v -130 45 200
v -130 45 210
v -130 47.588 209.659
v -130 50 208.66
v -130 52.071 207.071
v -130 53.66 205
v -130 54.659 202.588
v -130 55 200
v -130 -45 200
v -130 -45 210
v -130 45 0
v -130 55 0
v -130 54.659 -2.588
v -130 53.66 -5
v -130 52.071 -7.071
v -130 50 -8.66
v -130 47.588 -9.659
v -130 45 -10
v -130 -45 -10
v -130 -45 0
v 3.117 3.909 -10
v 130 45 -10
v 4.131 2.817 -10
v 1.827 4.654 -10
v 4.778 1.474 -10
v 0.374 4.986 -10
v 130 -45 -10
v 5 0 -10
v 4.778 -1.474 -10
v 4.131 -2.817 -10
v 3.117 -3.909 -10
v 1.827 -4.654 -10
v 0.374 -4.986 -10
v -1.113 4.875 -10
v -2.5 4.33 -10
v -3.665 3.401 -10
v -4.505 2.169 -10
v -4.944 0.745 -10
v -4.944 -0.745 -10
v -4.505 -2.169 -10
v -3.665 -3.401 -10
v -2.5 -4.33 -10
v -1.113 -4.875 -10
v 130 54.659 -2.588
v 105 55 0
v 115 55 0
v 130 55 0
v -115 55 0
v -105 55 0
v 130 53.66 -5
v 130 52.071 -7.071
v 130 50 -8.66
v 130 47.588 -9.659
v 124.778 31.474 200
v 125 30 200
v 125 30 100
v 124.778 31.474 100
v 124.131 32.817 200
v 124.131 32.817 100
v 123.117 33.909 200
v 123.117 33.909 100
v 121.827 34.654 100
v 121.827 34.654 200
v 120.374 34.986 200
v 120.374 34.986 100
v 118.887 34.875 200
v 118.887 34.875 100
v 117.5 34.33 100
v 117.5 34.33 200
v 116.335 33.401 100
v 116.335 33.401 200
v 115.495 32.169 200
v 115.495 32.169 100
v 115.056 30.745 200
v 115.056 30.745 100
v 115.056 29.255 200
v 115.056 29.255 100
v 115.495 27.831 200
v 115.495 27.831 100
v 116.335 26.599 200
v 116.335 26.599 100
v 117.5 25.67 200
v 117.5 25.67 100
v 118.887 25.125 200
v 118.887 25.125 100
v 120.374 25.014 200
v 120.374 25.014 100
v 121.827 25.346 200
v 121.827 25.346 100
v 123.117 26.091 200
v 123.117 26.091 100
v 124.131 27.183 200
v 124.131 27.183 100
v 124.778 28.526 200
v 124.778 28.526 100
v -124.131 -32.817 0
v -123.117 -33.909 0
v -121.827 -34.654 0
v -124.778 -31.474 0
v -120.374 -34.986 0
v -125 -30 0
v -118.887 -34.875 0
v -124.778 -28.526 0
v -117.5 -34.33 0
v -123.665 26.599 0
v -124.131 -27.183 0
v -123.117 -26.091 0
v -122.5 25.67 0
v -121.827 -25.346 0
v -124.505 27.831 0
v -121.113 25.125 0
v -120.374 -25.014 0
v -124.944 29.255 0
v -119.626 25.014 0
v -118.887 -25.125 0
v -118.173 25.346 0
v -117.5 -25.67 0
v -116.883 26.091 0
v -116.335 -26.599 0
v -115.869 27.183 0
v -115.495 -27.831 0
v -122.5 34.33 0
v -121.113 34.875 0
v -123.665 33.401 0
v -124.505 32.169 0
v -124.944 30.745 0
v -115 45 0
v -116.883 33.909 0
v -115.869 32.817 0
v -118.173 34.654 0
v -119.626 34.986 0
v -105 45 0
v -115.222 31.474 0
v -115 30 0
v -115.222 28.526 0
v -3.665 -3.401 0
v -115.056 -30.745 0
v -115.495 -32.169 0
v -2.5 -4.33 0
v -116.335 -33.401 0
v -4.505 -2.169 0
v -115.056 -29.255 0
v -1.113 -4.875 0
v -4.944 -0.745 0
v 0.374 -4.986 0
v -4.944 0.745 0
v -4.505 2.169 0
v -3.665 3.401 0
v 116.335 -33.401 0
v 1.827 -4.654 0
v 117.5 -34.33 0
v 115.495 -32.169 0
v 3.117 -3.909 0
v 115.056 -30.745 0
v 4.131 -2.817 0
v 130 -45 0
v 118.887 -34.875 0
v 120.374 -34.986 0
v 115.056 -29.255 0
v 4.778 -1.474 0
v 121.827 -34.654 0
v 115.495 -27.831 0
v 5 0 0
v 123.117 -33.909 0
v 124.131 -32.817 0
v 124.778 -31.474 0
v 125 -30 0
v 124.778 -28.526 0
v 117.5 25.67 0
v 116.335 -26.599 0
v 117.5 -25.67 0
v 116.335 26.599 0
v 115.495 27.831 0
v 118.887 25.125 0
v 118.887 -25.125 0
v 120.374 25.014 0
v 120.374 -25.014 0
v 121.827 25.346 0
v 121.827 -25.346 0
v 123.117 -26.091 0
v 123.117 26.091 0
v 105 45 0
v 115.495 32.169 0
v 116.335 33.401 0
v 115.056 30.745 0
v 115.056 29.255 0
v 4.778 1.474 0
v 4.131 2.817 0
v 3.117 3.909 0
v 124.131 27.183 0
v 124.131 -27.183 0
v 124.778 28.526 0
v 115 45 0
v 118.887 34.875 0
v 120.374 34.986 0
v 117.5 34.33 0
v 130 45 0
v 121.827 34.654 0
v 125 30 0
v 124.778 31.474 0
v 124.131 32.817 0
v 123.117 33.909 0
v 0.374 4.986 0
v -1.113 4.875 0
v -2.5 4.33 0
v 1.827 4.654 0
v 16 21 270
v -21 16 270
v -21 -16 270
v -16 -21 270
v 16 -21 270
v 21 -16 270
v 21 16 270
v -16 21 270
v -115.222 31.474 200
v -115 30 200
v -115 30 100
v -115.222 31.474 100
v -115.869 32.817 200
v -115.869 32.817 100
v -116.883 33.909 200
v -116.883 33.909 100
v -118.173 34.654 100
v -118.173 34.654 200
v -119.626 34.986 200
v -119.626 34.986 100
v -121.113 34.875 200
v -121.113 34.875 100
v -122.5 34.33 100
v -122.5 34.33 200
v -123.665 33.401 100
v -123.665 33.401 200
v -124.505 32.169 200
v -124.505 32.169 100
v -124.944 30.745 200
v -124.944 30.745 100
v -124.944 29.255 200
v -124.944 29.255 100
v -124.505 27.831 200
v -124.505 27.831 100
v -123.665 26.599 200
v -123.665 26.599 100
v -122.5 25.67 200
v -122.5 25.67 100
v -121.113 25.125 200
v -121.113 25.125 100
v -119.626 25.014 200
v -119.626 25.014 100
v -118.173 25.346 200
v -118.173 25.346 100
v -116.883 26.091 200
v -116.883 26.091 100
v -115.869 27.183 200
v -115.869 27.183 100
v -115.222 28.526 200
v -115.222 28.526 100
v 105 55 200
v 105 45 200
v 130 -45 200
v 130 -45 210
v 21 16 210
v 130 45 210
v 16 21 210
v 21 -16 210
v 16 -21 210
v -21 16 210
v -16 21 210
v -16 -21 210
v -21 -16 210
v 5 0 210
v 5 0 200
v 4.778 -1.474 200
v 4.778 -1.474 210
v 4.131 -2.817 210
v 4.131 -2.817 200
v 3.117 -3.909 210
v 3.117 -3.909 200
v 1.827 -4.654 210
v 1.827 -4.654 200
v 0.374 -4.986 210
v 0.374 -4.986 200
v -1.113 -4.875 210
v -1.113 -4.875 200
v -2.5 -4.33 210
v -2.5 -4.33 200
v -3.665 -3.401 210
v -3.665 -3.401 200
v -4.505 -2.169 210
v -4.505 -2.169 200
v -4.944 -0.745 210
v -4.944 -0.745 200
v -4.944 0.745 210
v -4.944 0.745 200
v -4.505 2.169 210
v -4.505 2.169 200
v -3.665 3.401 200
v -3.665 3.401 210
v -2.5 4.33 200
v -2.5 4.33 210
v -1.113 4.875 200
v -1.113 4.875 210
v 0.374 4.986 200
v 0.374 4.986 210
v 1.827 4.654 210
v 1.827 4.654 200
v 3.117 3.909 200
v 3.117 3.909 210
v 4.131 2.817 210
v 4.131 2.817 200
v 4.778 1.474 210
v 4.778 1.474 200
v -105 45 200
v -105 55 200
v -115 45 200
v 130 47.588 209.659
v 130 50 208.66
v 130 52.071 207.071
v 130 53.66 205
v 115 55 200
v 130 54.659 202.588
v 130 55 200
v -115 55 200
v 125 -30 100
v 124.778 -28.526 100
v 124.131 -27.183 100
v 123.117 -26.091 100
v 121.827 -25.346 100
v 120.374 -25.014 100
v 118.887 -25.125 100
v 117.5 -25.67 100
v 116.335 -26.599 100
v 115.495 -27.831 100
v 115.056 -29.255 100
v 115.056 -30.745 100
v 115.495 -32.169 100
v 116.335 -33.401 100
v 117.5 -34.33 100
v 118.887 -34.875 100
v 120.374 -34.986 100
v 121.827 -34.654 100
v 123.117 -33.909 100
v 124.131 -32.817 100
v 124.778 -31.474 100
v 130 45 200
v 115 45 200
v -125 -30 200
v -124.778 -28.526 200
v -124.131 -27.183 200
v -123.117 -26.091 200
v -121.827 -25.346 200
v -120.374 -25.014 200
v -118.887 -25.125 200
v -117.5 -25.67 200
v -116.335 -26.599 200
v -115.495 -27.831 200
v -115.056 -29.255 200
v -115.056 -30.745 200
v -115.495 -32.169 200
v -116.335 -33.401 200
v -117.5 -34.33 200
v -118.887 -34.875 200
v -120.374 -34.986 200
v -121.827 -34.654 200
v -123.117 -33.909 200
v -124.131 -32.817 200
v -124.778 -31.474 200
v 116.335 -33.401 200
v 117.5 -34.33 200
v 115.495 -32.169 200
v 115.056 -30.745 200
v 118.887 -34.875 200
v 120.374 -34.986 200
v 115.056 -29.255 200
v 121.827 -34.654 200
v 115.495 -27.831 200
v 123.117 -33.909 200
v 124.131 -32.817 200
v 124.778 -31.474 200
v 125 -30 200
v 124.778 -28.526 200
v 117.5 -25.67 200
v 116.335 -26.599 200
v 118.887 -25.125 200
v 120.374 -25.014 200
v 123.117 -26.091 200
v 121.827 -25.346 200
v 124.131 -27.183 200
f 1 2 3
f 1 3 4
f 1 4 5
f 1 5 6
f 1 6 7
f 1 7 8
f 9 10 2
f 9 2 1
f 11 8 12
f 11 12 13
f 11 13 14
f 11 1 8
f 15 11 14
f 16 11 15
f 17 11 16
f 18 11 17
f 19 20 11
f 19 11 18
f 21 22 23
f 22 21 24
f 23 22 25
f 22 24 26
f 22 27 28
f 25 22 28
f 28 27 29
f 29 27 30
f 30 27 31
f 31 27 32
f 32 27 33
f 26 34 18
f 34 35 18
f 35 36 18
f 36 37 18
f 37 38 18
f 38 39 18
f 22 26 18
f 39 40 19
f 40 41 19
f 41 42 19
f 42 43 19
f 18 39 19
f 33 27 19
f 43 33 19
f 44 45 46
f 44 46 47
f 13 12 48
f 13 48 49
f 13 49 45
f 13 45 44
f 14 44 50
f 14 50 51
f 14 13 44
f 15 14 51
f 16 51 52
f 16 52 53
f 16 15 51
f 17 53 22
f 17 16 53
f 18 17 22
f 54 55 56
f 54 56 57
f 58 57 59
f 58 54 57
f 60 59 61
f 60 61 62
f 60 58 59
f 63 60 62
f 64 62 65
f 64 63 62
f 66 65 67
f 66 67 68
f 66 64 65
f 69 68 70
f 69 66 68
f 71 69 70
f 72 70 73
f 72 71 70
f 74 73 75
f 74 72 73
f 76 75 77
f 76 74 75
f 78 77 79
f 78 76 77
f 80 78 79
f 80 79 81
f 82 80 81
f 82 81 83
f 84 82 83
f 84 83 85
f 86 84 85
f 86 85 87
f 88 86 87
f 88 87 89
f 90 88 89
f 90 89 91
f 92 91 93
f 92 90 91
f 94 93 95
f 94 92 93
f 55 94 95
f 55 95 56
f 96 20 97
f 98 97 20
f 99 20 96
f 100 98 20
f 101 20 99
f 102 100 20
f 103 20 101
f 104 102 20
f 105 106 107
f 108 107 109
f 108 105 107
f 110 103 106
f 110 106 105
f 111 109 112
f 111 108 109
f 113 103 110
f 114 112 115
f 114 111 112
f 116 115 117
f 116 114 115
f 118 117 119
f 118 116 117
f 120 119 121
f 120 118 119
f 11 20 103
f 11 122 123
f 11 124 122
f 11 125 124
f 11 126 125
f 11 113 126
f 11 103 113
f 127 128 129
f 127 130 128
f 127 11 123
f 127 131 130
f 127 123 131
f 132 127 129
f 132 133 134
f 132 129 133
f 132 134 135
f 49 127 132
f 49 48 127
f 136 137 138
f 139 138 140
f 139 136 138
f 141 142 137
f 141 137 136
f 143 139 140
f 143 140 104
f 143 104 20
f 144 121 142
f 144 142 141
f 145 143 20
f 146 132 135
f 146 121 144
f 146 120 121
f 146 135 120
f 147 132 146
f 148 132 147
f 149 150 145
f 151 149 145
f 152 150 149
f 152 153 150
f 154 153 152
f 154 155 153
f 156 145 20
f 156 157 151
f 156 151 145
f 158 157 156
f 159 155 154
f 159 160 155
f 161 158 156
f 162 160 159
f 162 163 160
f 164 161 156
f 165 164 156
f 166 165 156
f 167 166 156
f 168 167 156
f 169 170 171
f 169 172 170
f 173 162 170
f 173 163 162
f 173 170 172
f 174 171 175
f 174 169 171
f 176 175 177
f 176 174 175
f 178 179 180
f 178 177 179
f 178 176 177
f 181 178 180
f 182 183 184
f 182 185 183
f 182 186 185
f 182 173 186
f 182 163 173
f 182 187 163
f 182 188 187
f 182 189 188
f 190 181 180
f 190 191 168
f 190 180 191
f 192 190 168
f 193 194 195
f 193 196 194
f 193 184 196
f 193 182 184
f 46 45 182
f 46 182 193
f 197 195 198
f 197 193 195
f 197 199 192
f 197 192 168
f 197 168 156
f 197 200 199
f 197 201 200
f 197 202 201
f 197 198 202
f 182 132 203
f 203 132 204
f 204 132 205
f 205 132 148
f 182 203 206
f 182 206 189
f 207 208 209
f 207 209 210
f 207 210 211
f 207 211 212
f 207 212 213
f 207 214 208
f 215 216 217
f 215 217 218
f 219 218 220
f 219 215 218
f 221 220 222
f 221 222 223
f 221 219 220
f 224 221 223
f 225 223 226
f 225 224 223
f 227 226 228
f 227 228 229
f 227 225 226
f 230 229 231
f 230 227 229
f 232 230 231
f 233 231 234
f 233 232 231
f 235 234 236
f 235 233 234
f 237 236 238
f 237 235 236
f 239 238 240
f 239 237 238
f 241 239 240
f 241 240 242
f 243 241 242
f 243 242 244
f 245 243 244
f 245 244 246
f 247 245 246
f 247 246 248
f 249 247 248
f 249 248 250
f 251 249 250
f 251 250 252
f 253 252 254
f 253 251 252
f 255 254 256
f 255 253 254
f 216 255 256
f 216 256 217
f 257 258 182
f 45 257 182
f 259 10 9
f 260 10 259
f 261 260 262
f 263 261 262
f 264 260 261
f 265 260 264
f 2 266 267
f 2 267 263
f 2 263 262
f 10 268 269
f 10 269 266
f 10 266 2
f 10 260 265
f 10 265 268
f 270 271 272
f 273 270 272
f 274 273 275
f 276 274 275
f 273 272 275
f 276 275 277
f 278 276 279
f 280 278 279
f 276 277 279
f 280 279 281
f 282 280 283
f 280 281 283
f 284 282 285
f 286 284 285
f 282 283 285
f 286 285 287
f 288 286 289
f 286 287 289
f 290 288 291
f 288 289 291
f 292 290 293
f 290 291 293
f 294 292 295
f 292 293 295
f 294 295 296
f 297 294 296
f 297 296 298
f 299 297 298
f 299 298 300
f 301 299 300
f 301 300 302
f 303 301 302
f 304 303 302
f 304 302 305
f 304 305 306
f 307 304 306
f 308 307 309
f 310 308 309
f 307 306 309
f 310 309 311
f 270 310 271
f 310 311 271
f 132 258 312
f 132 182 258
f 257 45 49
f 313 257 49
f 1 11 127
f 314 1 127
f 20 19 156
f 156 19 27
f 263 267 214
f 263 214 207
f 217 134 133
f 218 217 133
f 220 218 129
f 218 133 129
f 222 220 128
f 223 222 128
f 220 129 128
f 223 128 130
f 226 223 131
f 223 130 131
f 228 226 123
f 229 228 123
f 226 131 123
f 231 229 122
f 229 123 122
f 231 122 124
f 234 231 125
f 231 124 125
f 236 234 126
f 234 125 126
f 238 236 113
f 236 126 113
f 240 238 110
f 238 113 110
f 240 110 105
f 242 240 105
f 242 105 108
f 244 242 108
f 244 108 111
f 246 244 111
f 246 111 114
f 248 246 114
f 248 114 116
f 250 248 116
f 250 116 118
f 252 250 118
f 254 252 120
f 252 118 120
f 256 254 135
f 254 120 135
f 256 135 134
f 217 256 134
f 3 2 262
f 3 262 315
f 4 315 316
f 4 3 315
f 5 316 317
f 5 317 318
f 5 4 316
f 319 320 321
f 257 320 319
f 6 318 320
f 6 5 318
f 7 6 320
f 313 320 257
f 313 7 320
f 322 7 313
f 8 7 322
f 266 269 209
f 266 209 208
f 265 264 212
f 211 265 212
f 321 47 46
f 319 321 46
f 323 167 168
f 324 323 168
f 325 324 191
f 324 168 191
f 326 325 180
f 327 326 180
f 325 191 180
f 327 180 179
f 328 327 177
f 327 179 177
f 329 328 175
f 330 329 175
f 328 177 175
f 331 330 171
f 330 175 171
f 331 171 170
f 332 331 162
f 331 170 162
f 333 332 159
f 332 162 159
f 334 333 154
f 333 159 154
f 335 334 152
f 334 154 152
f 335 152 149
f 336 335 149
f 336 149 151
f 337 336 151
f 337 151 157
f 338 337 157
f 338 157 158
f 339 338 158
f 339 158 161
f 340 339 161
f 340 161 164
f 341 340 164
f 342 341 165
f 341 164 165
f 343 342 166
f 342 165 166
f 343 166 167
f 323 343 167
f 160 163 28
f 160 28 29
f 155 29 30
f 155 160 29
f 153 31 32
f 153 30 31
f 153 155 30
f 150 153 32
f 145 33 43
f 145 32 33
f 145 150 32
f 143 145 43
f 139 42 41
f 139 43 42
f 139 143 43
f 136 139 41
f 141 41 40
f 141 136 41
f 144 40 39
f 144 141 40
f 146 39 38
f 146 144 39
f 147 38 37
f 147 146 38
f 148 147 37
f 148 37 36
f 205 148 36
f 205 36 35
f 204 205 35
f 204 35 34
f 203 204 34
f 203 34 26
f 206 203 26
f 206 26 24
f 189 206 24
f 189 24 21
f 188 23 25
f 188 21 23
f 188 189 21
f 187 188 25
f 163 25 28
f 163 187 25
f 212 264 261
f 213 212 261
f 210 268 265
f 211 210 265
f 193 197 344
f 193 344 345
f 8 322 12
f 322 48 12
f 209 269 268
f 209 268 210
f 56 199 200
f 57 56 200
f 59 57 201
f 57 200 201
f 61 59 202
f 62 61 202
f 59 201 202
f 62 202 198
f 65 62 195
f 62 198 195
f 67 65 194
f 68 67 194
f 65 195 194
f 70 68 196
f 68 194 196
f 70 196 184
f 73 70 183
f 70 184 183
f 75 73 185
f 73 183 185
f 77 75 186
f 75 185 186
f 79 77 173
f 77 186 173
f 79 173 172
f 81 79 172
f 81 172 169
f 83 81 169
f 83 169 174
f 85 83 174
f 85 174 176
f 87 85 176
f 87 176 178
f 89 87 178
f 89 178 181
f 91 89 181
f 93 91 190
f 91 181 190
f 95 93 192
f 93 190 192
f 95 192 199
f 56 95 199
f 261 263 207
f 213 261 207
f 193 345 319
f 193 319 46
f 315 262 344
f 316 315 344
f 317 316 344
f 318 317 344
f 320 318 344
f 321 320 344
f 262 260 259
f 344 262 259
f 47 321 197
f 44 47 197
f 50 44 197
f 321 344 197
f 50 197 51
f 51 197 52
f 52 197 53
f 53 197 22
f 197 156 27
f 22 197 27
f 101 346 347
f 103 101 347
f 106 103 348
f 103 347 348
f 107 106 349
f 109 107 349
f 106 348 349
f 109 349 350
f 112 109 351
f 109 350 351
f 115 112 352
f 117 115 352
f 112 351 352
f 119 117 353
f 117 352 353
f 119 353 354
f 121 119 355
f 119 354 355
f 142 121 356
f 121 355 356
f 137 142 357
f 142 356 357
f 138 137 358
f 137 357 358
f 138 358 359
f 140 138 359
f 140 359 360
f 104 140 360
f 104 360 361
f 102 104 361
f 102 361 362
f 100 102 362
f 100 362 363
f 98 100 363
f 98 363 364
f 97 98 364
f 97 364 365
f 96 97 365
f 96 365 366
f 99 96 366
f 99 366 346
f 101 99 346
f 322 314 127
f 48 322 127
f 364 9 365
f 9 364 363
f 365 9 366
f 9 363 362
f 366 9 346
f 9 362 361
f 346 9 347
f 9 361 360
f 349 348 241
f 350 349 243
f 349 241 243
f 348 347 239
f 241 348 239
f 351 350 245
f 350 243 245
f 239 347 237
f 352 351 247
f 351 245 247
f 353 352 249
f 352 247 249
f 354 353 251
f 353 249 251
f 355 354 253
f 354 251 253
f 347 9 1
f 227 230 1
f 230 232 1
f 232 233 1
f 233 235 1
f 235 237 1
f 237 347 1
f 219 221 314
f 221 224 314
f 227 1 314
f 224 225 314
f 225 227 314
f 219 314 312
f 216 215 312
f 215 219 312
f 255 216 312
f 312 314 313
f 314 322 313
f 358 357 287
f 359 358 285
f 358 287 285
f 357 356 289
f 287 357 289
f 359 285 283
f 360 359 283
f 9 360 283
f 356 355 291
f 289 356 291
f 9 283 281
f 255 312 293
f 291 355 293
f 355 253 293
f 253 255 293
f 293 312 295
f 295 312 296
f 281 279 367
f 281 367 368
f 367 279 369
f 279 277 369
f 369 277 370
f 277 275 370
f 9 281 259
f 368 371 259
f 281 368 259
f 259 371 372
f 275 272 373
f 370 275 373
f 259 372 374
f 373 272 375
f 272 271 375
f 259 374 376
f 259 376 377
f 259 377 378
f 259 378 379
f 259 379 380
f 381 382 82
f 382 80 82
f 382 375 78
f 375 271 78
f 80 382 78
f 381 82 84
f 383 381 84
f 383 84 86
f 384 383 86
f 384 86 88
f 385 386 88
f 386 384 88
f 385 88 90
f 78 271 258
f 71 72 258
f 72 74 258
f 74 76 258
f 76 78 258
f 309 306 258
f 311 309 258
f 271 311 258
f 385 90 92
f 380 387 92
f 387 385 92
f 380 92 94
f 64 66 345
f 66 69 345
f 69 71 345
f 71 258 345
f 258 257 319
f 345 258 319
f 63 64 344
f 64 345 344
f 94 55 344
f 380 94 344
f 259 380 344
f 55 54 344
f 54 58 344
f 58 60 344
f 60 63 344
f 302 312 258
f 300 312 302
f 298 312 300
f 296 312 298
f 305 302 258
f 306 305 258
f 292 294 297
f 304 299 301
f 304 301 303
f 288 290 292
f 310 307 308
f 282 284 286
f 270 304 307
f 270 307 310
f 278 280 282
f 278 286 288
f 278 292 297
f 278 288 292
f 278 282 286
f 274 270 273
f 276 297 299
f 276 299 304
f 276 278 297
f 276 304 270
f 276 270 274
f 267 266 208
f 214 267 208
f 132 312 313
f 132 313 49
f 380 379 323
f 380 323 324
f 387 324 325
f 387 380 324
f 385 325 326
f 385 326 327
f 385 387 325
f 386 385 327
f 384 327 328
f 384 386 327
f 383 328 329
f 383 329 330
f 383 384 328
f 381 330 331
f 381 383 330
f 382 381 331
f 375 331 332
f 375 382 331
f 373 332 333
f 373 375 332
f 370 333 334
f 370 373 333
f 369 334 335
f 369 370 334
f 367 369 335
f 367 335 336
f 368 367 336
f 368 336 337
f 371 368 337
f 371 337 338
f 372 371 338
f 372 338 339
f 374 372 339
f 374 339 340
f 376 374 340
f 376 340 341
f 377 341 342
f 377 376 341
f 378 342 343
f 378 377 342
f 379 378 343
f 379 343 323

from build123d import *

# Parameters (mm, degrees)
SKETCH1_W                      = 130
SKETCH1_H                      = 45
SKETCH1_R                      = 5
BOSS_EXTRUDE1_DEPTH            = 10
SKETCH1_5_R                    = 5
BOSS_EXTRUDE2_DEPTH            = 100
MIRROR1_START                  = -10
MIRROR1_DEPTH                  = 10
MIRROR1_2_OUTLINE_R            = 5
MIRROR1_2_DEPTH                = 100
SKETCH2_W                      = 130
SKETCH2_H                      = 220
SKETCH2_W_2                    = 10
SKETCH2_H_2                    = 200
BOSS_EXTRUDE3_DEPTH            = 10
FILLET1_START                  = -131
FILLET1_DEPTH                  = 262
SKETCH3_W                      = 42
SKETCH3_H                      = 42
BOSS_EXTRUDE4_DEPTH            = 60
CHAMFER1_SIZE                  = 5
SKETCH4_R                      = 5
CUT_EXTRUDE1_DEPTH             = 10
CUT_EXTRUDE1_DIRECTION_2_REACH = 255.032


with BuildPart() as part:
    # Sketch1 → Boss-Extrude1 (new body)
    # profile 1 of 2: a face of its own
    with BuildSketch(Plane(origin=(0, 0, 0), x_dir=(1, 0, 0), z_dir=(0, 0, -1))):
        with Locations((-65, 22.5)):
            Rectangle(SKETCH1_W, SKETCH1_H)
        with Locations((-120, 30)):
            Circle(SKETCH1_R, mode=Mode.SUBTRACT)
    # profile 2 of 2: a face of its own
    with BuildSketch(Plane(origin=(0, 0, 0), x_dir=(1, 0, 0), z_dir=(0, 0, -1))):
        with Locations((-120, 30)):
            Circle(SKETCH1_R)
    extrude(amount=BOSS_EXTRUDE1_DEPTH)

    # Sketch1<5> → Boss-Extrude2 (add)
    with BuildSketch(Plane(origin=(0, 0, 0), x_dir=(1, 0, 0), z_dir=(0, 0, -1))):
        with Locations(Location((-120, 30, 0), (0, 0, 180))):
            Circle(SKETCH1_5_R)
    extrude(amount=-BOSS_EXTRUDE2_DEPTH)

    # Mirror1: read off the stored shape, not the designer's step
    # Mirror1 outline → Mirror1 (add)
    with BuildSketch(Plane.XY.offset(MIRROR1_START)):
        Polygon((130, 45), (-130, 45), (-130, 0), (0, 0), (0, -45), (130, -45), align=None)
    extrude(amount=MIRROR1_DEPTH)

    # Mirror1 2 outline → Mirror1 2 (add)
    with BuildSketch(Plane.XY):
        with Locations((120, -30)):
            Circle(MIRROR1_2_OUTLINE_R)
        with Locations((-120, 30)):
            Circle(MIRROR1_2_OUTLINE_R)
        with Locations((120, 30)):
            Circle(MIRROR1_2_OUTLINE_R)
    extrude(amount=MIRROR1_2_DEPTH)

    # Mirror2: part across plane


with BuildPart() as part_1:
    add(part.part)
    add(part.part.mirror(Plane(origin=(120, -30, 100), x_dir=(1, 0, 0), z_dir=(0, 0, -1))))

    # Sketch2 → Boss-Extrude3 (add)
    with BuildSketch(Plane(origin=(0, 45, 0), x_dir=(1, 0, 0), z_dir=(0, 1, 0))):
        with Locations((-65, -100)):
            Rectangle(SKETCH2_W, SKETCH2_H)
        with Locations((-110, -100)):
            Rectangle(SKETCH2_W_2, SKETCH2_H_2, mode=Mode.SUBTRACT)
    boss_extrude3 = extrude(amount=BOSS_EXTRUDE3_DEPTH)

    # Mirror3: Boss-Extrude3 across plane
    add(boss_extrude3.mirror(Plane(origin=(0, 55, -10), x_dir=(0, 0, 1), z_dir=(-1, 0, 0))))

    # Fillet1: read off the stored shape, not the designer's step
    # Fillet1 outline → Fillet1 (cut)
    with BuildSketch(Plane.YZ.offset(FILLET1_START)):
        with BuildLine():
            ThreePointArc((45, 210), (52.071067812, 207.071067812), (55, 200))
            Line((55, 200), (55, 210))
            Line((55, 210), (45, 210))
        make_face()
        with BuildLine():
            ThreePointArc((55, 0), (52.071067812, -7.071067812), (45, -10))
            Line((45, -10), (55, -10))
            Line((55, -10), (55, 0))
        make_face()
    extrude(amount=FILLET1_DEPTH, mode=Mode.SUBTRACT)

    # Sketch3 → Boss-Extrude4 (add)
    with BuildSketch(Plane.XY.offset(210)):
        Rectangle(SKETCH3_W, SKETCH3_H)
    extrude(amount=BOSS_EXTRUDE4_DEPTH)

    # Chamfer1
    chamfer1_edges = [part_1.edges().sort_by_distance(p)[0] for p in [
        (-21, -21, 240),
        (21, -21, 240),
        (21, 21, 240),
        (-21, 21, 240),
    ]]
    chamfer(chamfer1_edges, length=CHAMFER1_SIZE)

    # Sketch4 → Cut-Extrude1 (cut)
    with BuildSketch(Plane(origin=(0, 0, 200), x_dir=(-1, 0, 0), z_dir=(0, 0, -1))):
        with Locations(Location((0, 0, 0), (0, 0, 180))):
            Circle(SKETCH4_R)
    extrude(amount=-CUT_EXTRUDE1_DEPTH, mode=Mode.SUBTRACT)

    # Cut-Extrude1 direction 2: up to this face of the body (flat: up to its plane)
    cut_extrude1_direction_2_end = Plane(part_1.part.faces().sort_by_distance((0, 0, -10))[0])
    # Sketch4 → Cut-Extrude1 direction 2 (cut, up to the picked face)
    with BuildSketch(Plane(origin=(0, 0, 200), x_dir=(-1, 0, 0), z_dir=(0, 0, -1)), mode=Mode.PRIVATE) as cut_extrude1_direction_2_sk1:
        with Locations(Location((0, 0, 0), (0, 0, 180))):
            Circle(SKETCH4_R)
    cut_extrude1_direction_2_tool1 = split(extrude(cut_extrude1_direction_2_sk1.sketch, amount=CUT_EXTRUDE1_DIRECTION_2_REACH, mode=Mode.PRIVATE), bisect_by=cut_extrude1_direction_2_end, keep=Keep.BOTH, mode=Mode.PRIVATE)
    add(cut_extrude1_direction_2_tool1.solids().sort_by(Axis((0, 0, 200), (0, 0, -1)))[0], mode=Mode.SUBTRACT)


solid = part_1.part
